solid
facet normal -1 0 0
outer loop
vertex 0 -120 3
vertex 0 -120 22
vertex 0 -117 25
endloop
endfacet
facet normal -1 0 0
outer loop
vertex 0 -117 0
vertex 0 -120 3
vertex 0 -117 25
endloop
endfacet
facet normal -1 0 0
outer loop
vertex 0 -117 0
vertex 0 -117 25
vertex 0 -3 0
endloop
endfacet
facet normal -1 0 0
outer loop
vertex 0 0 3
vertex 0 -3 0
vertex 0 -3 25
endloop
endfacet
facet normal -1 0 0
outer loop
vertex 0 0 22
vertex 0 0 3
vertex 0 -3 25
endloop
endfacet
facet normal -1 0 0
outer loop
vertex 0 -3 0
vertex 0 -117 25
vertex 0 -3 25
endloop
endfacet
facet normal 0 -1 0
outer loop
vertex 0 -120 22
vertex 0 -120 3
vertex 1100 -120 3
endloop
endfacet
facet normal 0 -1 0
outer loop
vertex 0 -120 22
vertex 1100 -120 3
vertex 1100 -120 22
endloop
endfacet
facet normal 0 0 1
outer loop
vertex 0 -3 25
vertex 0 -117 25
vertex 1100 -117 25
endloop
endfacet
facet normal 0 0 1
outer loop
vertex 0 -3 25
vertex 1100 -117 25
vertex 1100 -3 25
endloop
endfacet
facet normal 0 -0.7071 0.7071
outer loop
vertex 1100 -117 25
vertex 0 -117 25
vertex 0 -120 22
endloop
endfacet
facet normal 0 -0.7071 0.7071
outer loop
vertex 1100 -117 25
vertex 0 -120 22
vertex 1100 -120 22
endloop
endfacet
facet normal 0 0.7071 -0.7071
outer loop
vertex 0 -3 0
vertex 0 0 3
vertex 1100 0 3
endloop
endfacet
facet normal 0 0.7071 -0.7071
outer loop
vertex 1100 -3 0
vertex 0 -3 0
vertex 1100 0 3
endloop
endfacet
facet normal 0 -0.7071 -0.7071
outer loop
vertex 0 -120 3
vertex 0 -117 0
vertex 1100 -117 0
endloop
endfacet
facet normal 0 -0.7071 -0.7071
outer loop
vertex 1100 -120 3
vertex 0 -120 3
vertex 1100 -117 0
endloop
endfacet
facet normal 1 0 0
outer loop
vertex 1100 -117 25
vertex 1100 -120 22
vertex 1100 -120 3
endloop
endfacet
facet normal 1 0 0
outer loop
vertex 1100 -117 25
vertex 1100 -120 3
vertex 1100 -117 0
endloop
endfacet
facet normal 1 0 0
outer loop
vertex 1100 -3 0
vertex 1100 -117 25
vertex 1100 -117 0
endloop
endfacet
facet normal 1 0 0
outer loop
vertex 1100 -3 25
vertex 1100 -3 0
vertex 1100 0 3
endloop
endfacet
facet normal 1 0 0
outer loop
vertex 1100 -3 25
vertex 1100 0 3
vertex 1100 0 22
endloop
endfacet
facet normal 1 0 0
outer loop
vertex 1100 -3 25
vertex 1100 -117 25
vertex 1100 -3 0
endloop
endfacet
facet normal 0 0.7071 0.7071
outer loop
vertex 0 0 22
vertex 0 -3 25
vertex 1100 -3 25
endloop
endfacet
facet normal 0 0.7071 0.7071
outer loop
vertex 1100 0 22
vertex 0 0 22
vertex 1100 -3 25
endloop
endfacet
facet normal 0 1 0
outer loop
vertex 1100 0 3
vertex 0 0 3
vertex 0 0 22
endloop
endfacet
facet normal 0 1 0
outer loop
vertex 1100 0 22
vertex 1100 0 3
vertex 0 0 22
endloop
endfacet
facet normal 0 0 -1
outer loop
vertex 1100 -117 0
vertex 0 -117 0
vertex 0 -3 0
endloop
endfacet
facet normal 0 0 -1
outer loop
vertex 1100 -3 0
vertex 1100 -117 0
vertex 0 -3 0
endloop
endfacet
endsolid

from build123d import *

# Parameters (mm, degrees)
F0_W     = 120
F0_H     = 25
F1_DEPTH = 1100
F2_SIZE  = 3


with BuildPart() as f1:
    # F0 (on Right) → F1 (new body)
    with BuildSketch(Plane.YZ):
        with Locations((-60, 12.5)):
            Rectangle(F0_W, F0_H)
    extrude(amount=F1_DEPTH)

    # F2
    f2_edges = [f1.edges().sort_by_distance(p)[0] for p in [
        (550, 0, 25),
        (550, -120, 25),
        (550, -120, 0),
        (550, 0, 0),
    ]]
    chamfer(f2_edges, length=F2_SIZE)


solid = f1.part
